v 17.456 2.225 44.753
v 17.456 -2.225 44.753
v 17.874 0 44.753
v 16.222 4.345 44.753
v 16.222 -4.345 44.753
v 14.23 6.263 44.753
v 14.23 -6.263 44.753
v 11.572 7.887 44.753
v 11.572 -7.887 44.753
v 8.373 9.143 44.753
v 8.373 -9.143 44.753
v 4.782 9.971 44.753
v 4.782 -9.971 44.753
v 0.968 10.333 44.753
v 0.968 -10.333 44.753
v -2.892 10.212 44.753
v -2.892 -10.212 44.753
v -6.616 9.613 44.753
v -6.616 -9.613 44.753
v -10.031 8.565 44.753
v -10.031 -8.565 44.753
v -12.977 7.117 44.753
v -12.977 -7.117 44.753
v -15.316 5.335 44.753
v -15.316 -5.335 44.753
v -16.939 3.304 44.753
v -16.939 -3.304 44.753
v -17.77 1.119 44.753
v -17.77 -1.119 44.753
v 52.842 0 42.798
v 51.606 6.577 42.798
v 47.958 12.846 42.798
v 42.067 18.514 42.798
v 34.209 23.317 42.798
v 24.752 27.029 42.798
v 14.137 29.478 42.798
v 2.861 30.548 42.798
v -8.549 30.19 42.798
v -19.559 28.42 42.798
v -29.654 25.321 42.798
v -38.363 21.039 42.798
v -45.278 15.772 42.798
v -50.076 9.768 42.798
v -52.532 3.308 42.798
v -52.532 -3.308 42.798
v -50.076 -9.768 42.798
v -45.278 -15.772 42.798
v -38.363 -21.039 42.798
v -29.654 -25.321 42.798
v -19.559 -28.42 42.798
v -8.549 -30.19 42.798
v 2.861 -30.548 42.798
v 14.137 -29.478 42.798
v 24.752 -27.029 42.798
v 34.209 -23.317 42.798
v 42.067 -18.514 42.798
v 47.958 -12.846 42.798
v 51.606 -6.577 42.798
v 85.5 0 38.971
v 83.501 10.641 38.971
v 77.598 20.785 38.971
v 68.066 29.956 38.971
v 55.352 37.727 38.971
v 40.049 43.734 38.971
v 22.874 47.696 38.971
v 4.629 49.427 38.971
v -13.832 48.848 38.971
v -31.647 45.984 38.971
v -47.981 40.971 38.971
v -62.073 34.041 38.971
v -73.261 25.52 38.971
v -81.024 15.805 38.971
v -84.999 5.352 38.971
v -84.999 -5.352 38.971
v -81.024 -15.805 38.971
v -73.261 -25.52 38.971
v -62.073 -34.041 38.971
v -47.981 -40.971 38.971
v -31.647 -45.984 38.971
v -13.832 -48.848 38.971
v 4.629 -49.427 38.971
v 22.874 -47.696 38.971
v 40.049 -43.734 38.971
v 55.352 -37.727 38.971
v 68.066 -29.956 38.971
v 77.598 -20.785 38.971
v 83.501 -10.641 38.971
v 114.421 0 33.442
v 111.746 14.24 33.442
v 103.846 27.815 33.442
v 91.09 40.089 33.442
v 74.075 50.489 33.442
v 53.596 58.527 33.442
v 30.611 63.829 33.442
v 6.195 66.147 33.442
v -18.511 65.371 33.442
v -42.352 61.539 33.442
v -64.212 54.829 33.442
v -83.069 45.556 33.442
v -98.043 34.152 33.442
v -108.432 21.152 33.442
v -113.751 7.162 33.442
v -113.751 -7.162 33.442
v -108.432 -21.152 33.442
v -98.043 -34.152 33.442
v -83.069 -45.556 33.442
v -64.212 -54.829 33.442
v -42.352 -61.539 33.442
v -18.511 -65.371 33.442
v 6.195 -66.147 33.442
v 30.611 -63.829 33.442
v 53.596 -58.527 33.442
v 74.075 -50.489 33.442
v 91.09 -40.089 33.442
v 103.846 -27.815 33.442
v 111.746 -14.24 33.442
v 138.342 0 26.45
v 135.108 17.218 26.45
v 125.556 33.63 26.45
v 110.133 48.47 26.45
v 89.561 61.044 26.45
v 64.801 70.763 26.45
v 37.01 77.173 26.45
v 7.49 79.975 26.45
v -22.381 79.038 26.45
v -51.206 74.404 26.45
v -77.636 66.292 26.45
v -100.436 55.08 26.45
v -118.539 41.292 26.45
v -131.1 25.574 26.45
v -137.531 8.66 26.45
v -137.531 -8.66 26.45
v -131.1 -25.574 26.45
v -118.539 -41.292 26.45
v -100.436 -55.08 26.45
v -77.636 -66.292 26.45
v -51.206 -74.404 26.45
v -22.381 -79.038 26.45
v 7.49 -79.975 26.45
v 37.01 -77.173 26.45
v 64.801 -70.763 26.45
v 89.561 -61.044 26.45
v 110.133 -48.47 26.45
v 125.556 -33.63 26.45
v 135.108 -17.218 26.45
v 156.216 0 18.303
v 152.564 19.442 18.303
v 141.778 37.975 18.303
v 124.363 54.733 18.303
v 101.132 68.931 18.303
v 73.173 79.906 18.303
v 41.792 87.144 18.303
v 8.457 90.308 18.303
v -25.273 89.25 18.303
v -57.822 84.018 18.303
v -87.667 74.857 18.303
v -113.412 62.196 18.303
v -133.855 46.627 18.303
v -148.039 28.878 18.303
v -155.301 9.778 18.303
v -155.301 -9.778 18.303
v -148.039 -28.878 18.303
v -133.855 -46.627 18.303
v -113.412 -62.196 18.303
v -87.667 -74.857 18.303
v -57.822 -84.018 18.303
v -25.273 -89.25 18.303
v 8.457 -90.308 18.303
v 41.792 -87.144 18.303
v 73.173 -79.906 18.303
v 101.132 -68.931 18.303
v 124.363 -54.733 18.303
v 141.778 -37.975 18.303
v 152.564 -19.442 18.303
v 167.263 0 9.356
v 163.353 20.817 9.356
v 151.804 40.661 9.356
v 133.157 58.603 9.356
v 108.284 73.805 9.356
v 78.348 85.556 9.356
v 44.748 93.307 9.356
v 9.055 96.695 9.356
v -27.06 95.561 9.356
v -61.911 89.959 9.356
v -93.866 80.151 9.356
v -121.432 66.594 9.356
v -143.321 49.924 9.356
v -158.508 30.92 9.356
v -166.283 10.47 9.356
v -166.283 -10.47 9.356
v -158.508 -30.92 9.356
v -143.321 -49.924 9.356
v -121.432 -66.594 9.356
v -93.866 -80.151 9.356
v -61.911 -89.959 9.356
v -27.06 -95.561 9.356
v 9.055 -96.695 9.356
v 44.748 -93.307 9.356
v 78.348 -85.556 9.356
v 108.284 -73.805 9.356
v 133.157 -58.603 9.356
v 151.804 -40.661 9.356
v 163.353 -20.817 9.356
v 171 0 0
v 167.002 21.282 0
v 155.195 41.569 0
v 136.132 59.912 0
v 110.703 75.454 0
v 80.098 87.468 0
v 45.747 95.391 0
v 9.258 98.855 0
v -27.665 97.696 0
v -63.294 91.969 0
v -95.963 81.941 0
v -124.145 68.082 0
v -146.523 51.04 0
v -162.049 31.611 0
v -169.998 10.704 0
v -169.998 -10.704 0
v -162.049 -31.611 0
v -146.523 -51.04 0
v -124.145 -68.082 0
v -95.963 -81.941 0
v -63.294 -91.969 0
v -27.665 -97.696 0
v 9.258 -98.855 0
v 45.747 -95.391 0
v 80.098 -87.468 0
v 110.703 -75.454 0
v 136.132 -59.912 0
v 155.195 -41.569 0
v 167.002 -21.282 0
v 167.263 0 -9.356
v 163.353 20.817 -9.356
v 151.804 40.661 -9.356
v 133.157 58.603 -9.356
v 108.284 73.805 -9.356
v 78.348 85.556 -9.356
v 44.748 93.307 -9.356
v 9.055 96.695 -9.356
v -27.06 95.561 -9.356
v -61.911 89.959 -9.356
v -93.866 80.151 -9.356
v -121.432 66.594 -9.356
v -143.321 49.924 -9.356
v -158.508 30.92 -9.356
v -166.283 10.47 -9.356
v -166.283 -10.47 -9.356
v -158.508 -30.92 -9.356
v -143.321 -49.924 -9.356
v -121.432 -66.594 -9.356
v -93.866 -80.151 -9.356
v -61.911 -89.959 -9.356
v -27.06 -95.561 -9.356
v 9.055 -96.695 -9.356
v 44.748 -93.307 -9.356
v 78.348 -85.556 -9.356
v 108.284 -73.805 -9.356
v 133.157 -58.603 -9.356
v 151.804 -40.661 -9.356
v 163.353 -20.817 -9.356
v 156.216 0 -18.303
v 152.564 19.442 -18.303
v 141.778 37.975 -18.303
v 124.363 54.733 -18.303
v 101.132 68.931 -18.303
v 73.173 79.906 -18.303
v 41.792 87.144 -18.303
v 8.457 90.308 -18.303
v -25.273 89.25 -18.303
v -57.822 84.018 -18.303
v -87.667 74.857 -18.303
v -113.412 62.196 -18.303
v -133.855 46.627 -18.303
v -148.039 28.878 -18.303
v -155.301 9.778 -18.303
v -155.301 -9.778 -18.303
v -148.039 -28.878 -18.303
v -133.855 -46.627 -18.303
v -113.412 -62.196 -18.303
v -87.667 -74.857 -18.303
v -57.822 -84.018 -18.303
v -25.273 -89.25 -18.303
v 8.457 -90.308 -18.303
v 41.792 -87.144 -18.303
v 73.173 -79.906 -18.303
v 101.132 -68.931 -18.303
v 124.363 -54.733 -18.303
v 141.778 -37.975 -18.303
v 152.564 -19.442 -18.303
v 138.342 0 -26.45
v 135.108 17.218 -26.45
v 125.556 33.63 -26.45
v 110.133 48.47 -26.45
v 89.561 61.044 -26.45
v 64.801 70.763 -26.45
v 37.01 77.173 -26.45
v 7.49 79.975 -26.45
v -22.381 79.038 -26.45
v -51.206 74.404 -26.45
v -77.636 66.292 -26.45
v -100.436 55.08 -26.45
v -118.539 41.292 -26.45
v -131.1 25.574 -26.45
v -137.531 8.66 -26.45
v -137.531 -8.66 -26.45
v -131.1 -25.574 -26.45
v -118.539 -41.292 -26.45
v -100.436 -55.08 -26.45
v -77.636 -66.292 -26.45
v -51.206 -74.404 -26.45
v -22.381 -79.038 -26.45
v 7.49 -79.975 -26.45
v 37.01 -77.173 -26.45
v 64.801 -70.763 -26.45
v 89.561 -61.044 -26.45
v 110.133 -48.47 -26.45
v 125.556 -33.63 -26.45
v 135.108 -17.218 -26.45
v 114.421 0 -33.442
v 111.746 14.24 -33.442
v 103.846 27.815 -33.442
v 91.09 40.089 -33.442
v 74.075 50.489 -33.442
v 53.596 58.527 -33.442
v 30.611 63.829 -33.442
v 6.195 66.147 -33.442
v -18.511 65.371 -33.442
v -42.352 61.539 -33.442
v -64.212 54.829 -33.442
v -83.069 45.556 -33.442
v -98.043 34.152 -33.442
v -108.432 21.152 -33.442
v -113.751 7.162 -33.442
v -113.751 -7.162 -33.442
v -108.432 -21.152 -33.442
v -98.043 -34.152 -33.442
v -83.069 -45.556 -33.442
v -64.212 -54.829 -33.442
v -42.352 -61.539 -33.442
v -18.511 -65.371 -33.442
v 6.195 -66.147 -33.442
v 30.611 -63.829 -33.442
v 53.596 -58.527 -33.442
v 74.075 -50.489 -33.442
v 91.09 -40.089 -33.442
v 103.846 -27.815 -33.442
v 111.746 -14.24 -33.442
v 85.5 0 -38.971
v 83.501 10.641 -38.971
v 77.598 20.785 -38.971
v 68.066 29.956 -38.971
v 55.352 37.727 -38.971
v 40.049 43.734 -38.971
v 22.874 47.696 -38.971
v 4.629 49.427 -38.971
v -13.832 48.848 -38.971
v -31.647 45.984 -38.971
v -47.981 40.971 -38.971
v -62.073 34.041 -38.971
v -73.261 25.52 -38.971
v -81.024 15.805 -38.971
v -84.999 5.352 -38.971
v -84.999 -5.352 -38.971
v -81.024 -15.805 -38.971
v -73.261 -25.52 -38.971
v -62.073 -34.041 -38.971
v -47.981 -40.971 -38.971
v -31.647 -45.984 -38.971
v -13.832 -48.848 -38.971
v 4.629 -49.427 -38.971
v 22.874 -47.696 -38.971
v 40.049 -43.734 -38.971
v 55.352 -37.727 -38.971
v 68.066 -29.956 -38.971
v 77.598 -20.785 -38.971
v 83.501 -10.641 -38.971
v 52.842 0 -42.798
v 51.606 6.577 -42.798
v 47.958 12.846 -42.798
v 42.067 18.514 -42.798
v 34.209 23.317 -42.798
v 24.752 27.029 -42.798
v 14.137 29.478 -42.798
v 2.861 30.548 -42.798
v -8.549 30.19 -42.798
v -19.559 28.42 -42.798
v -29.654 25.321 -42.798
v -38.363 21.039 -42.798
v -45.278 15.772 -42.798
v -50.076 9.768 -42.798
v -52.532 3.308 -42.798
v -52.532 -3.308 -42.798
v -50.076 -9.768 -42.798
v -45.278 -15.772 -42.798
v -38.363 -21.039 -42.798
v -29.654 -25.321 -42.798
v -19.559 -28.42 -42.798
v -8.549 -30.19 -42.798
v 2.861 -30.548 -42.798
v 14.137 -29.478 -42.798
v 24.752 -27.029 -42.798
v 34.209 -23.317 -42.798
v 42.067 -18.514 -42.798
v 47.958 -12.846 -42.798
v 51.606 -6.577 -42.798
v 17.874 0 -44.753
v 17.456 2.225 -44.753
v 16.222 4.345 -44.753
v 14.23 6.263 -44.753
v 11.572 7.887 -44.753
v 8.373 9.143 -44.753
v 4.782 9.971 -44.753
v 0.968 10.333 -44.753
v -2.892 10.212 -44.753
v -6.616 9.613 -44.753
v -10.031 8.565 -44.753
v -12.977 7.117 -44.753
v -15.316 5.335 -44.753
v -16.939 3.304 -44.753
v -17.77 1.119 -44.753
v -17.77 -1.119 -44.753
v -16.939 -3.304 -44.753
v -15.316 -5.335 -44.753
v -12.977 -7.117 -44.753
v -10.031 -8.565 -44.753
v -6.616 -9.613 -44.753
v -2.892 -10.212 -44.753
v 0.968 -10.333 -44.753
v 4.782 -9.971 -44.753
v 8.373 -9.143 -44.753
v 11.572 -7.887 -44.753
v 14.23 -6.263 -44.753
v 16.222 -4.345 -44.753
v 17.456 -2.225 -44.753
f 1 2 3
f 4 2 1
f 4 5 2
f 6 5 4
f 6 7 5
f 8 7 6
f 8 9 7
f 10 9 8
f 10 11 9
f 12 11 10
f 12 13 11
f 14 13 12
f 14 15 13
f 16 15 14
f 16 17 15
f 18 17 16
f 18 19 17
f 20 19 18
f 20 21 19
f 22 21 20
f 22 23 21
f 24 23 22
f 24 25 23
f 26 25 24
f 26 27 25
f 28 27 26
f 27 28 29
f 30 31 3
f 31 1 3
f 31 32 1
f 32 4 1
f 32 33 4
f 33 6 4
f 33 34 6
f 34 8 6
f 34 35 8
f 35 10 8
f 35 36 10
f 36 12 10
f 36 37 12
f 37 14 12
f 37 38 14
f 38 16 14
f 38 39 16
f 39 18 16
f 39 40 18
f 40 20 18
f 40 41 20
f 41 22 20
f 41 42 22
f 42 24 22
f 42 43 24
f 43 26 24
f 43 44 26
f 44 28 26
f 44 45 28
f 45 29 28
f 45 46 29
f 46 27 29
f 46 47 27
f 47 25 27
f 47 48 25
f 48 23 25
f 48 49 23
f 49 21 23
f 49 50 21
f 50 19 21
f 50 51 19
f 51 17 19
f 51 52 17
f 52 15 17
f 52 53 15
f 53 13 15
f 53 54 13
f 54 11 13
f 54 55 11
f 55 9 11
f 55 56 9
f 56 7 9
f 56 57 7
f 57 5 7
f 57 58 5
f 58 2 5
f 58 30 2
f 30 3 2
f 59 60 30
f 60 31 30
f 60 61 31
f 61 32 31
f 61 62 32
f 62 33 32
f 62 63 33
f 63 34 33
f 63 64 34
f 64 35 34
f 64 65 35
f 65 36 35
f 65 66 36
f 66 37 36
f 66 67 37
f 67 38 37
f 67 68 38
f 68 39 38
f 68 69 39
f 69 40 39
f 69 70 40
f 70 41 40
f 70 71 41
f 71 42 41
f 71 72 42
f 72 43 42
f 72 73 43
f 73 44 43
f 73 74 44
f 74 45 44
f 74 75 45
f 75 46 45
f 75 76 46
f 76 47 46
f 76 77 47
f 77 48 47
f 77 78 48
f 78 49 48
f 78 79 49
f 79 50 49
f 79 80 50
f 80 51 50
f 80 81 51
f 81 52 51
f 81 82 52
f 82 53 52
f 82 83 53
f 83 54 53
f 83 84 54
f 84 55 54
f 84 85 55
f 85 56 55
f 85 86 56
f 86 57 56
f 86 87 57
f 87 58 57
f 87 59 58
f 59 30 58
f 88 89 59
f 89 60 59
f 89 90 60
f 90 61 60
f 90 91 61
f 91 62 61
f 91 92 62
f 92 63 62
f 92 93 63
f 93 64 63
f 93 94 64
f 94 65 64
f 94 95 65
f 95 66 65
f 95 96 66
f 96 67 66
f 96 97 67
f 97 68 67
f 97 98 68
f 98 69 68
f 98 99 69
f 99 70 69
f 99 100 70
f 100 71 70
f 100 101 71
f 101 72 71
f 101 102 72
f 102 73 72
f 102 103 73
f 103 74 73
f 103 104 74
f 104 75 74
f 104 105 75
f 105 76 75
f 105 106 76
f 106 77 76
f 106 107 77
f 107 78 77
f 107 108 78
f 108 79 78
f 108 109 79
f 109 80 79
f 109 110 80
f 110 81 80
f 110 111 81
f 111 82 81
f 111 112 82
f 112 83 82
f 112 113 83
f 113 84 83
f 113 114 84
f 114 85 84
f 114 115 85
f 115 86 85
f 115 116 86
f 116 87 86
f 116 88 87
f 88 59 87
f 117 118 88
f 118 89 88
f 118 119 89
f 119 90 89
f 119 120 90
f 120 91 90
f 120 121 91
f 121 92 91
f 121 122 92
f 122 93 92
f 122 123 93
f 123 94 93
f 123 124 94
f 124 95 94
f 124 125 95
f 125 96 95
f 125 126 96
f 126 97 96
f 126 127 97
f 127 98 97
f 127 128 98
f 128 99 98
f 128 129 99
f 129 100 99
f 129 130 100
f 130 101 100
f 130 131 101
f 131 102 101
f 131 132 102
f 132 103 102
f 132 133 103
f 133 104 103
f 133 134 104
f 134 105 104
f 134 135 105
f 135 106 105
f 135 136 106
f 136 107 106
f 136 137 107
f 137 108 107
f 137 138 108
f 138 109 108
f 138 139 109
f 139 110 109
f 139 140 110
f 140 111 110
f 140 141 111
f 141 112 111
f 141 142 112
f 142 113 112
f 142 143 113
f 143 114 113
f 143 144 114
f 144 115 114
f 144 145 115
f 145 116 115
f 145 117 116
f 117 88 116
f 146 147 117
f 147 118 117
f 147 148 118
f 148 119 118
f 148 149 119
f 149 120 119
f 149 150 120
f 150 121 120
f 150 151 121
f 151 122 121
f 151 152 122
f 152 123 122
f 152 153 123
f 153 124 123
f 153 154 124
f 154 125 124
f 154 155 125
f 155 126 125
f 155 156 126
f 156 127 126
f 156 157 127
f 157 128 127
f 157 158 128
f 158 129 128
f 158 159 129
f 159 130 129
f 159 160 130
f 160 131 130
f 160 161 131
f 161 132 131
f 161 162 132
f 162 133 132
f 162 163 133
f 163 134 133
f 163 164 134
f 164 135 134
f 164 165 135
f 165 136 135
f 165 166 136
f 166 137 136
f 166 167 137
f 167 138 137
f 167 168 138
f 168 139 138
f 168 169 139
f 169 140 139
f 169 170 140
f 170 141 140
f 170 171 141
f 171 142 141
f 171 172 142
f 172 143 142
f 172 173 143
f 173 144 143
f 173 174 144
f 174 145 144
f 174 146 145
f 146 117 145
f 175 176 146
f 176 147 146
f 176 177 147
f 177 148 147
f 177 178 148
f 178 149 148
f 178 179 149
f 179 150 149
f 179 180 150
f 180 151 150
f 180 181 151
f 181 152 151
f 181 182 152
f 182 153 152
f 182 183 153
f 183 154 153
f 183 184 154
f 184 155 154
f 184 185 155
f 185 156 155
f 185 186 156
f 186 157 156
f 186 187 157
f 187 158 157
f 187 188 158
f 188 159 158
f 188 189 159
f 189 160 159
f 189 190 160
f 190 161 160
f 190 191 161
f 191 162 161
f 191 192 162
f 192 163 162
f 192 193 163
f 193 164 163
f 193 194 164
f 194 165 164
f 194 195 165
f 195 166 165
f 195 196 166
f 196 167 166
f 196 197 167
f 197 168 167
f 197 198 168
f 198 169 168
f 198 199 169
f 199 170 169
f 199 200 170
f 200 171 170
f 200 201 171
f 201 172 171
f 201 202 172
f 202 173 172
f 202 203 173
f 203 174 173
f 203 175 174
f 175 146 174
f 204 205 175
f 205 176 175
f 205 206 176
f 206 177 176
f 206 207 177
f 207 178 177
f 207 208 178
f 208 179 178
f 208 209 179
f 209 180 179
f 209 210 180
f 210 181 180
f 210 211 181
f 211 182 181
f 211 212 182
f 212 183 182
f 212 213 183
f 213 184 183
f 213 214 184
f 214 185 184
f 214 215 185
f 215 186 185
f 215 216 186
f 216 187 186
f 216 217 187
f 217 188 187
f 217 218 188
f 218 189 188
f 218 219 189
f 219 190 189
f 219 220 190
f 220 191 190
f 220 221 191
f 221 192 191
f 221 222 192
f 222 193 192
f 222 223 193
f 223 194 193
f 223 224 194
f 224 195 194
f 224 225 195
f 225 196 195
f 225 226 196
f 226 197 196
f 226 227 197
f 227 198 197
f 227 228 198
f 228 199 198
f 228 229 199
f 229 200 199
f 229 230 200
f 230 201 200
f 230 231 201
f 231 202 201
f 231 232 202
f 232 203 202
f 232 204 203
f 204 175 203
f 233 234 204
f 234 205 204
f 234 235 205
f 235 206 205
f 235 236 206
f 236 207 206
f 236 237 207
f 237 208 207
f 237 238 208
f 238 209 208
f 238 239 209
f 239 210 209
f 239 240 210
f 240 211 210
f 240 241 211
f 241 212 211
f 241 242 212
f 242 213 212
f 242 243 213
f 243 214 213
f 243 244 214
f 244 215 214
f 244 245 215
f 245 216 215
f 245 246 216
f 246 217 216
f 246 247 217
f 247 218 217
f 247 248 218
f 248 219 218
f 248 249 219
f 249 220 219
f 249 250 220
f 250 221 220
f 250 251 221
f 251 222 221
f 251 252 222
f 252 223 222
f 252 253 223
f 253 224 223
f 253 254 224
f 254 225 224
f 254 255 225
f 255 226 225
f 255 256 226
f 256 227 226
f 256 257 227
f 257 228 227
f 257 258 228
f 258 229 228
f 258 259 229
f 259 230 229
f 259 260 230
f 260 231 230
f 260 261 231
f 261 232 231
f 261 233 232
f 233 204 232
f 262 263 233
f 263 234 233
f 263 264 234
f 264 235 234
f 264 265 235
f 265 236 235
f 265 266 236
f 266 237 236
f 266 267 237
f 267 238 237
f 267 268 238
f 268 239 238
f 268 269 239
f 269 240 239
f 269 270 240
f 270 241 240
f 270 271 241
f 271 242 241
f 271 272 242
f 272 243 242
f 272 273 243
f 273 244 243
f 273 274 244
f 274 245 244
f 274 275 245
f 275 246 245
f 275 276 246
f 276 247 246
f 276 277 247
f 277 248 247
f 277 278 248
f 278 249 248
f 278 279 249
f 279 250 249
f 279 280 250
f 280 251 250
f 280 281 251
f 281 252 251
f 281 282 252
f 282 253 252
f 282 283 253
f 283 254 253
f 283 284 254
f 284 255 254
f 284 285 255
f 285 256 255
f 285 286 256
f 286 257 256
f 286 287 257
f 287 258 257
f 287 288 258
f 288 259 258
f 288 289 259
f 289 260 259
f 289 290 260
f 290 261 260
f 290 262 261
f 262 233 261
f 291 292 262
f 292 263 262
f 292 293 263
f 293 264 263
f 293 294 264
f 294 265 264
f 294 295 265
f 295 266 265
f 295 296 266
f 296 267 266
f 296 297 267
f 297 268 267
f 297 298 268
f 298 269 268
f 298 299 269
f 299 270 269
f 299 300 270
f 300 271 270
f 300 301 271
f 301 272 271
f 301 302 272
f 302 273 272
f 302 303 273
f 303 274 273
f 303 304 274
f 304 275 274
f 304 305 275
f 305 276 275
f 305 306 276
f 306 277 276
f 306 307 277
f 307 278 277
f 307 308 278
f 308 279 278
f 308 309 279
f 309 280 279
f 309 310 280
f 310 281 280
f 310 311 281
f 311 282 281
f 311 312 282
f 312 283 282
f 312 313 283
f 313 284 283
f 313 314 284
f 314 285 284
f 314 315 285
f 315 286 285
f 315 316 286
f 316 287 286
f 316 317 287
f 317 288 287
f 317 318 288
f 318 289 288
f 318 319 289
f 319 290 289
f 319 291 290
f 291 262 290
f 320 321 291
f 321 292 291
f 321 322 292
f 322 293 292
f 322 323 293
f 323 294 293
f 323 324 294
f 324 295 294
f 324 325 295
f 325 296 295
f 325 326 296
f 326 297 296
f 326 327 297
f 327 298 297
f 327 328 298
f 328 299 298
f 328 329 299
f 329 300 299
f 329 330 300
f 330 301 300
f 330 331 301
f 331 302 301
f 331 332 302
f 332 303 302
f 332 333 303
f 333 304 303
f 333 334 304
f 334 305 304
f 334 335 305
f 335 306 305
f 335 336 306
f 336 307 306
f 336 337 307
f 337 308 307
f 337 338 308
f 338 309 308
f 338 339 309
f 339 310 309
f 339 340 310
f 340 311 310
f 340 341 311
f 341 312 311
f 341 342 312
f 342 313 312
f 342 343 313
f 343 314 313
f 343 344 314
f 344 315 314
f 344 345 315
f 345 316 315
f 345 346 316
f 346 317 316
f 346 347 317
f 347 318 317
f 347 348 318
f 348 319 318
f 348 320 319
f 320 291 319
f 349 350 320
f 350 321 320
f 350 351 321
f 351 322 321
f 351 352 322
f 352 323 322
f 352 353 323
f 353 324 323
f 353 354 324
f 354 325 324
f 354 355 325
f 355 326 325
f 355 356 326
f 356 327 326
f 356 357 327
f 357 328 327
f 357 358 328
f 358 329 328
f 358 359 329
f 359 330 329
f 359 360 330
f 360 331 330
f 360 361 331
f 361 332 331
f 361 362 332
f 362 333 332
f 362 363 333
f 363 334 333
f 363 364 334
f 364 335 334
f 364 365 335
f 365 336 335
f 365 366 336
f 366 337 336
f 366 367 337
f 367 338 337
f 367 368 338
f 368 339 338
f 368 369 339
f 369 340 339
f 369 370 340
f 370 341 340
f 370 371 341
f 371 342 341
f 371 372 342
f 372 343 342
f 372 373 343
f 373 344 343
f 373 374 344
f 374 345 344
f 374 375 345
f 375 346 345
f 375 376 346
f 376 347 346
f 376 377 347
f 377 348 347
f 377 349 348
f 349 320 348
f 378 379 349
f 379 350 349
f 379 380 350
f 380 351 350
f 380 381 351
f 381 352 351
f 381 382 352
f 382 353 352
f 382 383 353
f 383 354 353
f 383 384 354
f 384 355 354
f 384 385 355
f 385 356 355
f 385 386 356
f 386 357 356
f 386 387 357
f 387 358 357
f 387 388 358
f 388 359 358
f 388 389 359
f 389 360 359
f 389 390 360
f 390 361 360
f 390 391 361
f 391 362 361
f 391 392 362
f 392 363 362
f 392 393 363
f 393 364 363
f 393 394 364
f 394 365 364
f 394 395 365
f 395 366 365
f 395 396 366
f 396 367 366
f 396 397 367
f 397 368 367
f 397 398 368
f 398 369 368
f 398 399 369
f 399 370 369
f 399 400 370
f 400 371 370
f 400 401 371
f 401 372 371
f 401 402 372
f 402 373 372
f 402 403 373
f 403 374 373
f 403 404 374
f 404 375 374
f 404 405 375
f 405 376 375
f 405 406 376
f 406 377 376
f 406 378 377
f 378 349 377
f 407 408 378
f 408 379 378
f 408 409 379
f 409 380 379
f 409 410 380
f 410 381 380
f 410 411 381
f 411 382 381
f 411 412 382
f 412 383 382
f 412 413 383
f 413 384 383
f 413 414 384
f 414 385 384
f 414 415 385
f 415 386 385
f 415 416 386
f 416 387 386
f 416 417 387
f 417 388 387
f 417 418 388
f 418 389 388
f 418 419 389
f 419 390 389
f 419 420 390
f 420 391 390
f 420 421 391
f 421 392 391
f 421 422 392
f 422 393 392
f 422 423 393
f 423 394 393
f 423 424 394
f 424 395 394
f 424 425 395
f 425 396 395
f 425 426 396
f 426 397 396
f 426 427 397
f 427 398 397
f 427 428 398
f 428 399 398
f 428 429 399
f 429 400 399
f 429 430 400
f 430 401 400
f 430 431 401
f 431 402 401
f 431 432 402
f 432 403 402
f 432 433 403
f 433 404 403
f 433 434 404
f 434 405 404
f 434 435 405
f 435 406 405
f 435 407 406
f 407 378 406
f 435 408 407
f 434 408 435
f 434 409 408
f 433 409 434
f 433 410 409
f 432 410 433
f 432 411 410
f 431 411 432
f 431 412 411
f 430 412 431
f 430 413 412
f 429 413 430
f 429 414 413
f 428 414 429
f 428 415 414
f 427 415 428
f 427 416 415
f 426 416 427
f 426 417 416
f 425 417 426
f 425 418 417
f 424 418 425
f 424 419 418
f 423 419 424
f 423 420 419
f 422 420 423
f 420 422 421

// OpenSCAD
// Generated by SolidPython 1.0.1 on 2020-07-29 00:46:54


scale(v = [19, 11, 5]) {
	sphere(r = 9);
}
/***********************************************
*********      SolidPython code:      **********
************************************************
 
# import packages: SolidPython
from solid import *
from solid.utils import *
from itertools import chain, combinations, permutations


class Resize:

    def __init__(self, scad_file):
        self.scad_file = scad_file
        #self.scad_file = import_scad(scad_file)
        # cone/cylinder param:
        self.r1 = 0
        self.r2 = 0
        self.h = 0
        # rectangular prism param:
        self.w = 0
        self.l = 0
        # ellipse param:
        self.r = 0

    # import OpenScad code (file name corresponds to shape)


    # classify shape + parameters
    def assign(self, param1, param2, param3):
        if self.scad_file == 'cone.scad':
            self.r1 = param1
            self.r2 = param2
            self.h = param3
        elif self.scad_file == 'cylinder.scad':
            self.r1 = param1
            self.r2 = param2
            self.h = param3
        elif self.scad_file == 'rectangularPrism.scad':
            self.h = param1
            self.l = param2
            self.w = param3
        else:
            self.r = param1
            self.h = param2

    # resize parameters
    def iterate(self):
        x = range(3, 20, 2)
        i = 1
        if self.scad_file == 'cone.scad':
            tempList = list(permutations(x, 2))
            for temp in tempList:
                param1 = temp[0]
                param2 = temp[1]
                filepath = 'produced_scad_files/' + 'cone' + str(param1) + '_' + str(param2) + '_' + '.scad'
                scad_render_to_file(cylinder(h=param1, r1=param2, r2=0), filepath)

        elif self.scad_file == 'cylinder.scad':
            tempList = list(permutations(x, 3))
            for temp in tempList:
                param1 = temp[0]
                param2 = temp[1]
                filepath = 'produced_scad_files/' + 'cylinder' + str(param1) + '_' + str(param2) + '_' + '.scad'
                scad_render_to_file(cylinder(h=param1, r1=param2, r2=param2), filepath)

        elif self.scad_file == 'rectangularPrism.scad':
            tempList = list(permutations(x, 3))
            for temp in tempList:
                param1 = temp[0]
                param2 = temp[1]
                param3 = temp[2]
                filepath = 'produced_scad_files/' + 'rectangularPrism' + str(param1) + '_' + str(param2) + '_' + str(
                    param3) + '.scad'
                scad_render_to_file(cube(size=(param1, param2, param3)), filepath)

        elif self.scad_file == 'ellipse.scad':
            tempList = list(permutations(x, 4))
            for temp in tempList:
                param1 = temp[0]
                param2 = temp[1]
                param3 = temp[2]
                param4 = temp[3]
                filepath = 'produced_scad_files/' + 'ellipse' + str(param1) + '_' + str(param2) + '_' + str(param3) + '_' + str(param4) + '.scad'
                scad_render_to_file(scale([param1, param2, param3])(sphere(r=param4)), filepath)

    def render_to_scadfile(self):
        scad_render_to_file(scad, 'example.scad') 
 
************************************************/
